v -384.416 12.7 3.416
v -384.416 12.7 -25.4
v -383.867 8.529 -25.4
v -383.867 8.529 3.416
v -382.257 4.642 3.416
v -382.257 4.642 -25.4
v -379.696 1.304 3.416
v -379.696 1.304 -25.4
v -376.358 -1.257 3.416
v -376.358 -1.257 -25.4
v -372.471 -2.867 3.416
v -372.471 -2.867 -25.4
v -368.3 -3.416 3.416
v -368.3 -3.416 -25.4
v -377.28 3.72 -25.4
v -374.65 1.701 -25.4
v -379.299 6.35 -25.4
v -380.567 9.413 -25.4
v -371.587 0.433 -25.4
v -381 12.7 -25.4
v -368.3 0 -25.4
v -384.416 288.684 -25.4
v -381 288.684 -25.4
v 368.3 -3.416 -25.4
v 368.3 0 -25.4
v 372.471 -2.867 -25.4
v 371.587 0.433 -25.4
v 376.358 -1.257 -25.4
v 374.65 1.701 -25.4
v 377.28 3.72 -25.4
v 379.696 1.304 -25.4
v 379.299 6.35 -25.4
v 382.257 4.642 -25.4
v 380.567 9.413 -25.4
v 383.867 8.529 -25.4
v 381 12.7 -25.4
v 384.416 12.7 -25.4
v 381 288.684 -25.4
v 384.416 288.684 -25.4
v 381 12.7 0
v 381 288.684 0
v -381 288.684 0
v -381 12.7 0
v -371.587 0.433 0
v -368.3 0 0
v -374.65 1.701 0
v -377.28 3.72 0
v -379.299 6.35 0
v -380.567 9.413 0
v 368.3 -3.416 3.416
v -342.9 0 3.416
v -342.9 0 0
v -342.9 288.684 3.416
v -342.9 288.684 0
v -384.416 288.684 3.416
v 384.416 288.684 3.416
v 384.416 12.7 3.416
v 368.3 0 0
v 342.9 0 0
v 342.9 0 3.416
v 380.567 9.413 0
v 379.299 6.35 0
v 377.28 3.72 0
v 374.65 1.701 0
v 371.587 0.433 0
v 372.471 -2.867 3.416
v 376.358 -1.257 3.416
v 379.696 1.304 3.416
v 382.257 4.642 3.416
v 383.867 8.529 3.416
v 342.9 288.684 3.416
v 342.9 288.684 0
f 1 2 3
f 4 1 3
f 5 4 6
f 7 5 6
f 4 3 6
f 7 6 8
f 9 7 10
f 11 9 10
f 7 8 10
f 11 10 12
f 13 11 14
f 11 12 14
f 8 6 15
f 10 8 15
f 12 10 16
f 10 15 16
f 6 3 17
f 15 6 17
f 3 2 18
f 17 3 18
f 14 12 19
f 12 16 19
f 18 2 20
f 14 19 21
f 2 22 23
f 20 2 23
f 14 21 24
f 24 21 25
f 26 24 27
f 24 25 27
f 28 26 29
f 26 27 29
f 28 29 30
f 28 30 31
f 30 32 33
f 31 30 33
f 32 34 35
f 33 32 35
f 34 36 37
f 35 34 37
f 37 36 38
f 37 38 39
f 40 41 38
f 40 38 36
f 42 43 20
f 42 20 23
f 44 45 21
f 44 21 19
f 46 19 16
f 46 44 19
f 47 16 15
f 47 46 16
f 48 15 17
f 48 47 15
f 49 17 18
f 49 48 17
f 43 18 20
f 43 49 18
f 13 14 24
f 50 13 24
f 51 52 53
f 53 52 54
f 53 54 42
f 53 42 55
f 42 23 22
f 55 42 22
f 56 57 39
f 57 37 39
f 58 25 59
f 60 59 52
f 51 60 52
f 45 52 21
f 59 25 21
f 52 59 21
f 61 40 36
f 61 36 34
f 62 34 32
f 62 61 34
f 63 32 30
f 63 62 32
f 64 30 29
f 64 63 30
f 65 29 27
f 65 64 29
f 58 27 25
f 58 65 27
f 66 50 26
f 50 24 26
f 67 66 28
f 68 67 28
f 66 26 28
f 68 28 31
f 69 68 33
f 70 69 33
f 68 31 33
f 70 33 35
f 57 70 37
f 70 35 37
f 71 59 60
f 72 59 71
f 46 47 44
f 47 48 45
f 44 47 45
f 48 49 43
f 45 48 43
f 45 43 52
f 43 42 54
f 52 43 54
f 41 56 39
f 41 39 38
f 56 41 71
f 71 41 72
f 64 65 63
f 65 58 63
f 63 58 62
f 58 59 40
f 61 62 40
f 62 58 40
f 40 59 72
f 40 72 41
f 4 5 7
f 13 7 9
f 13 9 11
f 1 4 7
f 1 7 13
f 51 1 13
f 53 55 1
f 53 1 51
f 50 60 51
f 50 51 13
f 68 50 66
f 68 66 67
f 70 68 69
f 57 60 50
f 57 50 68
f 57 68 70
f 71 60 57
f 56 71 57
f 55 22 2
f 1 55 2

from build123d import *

# Parameters (mm, degrees)
SIDE_DEPTH     = 25.4
PANEL_DEPTH    = 3.4163
BACK_CUT_REACH = 5.416
SKETCH4_W      = 685.8
SKETCH4_H      = 288.6837


with BuildPart() as part:
    # Sketch2 → Side (new body)
    with BuildSketch(Plane.XY):
        with BuildLine():
            Line((-381, 12.7), (-381, 288.6837))
            Line((-381, 288.6837), (-384.4163, 288.6837))
            Line((-384.4163, 288.6837), (-384.4163, 12.7))
            ThreePointArc((-384.4163, 12.7), (-379.695945018, 1.304054982), (-368.3, -3.4163))
            Line((-368.3, -3.4163), (368.3, -3.4163))
            ThreePointArc((368.3, -3.4163), (379.695945018, 1.304054982), (384.4163, 12.7))
            Line((384.4163, 12.7), (384.4163, 288.6837))
            Line((384.4163, 288.6837), (381, 288.6837))
            Line((381, 288.6837), (381, 12.7))
            ThreePointArc((381, 12.7), (377.280256121, 3.719743879), (368.3, 0))
            Line((368.3, 0), (-368.3, 0))
            ThreePointArc((-368.3, 0), (-377.280256121, 3.719743879), (-381, 12.7))
        make_face()
    extrude(amount=-SIDE_DEPTH)

    # Sketch3 → Panel (add)
    with BuildSketch(Plane.XY):
        with BuildLine():
            Line((-368.3, -3.4163), (368.3, -3.4163))
            ThreePointArc((368.3, -3.4163), (379.695945018, 1.304054982), (384.4163, 12.7))
            Line((384.4163, 12.7), (384.4163, 288.6837))
            Line((384.4163, 288.6837), (-384.4163, 288.6837))
            Line((-384.4163, 288.6837), (-384.4163, 12.7))
            ThreePointArc((-384.4163, 12.7), (-379.695945018, 1.304054982), (-368.3, -3.4163))
        make_face()
    extrude(amount=PANEL_DEPTH)

    # Sketch4 → Back Cut (cut, up to next)
    with BuildSketch(Plane(origin=(0, 0, 0), x_dir=(-1, 0, 0), z_dir=(0, 0, -1)), mode=Mode.PRIVATE) as back_cut_sk1:
        with Locations((0, 144.34185)):
            Rectangle(SKETCH4_W, SKETCH4_H)
    back_cut_tool1 = extrude(back_cut_sk1.sketch, amount=-BACK_CUT_REACH, mode=Mode.PRIVATE) & part.part
    add(back_cut_tool1.solids().sort_by_distance((0, 144.34185, 0))[0], mode=Mode.SUBTRACT)


solid = part.part
